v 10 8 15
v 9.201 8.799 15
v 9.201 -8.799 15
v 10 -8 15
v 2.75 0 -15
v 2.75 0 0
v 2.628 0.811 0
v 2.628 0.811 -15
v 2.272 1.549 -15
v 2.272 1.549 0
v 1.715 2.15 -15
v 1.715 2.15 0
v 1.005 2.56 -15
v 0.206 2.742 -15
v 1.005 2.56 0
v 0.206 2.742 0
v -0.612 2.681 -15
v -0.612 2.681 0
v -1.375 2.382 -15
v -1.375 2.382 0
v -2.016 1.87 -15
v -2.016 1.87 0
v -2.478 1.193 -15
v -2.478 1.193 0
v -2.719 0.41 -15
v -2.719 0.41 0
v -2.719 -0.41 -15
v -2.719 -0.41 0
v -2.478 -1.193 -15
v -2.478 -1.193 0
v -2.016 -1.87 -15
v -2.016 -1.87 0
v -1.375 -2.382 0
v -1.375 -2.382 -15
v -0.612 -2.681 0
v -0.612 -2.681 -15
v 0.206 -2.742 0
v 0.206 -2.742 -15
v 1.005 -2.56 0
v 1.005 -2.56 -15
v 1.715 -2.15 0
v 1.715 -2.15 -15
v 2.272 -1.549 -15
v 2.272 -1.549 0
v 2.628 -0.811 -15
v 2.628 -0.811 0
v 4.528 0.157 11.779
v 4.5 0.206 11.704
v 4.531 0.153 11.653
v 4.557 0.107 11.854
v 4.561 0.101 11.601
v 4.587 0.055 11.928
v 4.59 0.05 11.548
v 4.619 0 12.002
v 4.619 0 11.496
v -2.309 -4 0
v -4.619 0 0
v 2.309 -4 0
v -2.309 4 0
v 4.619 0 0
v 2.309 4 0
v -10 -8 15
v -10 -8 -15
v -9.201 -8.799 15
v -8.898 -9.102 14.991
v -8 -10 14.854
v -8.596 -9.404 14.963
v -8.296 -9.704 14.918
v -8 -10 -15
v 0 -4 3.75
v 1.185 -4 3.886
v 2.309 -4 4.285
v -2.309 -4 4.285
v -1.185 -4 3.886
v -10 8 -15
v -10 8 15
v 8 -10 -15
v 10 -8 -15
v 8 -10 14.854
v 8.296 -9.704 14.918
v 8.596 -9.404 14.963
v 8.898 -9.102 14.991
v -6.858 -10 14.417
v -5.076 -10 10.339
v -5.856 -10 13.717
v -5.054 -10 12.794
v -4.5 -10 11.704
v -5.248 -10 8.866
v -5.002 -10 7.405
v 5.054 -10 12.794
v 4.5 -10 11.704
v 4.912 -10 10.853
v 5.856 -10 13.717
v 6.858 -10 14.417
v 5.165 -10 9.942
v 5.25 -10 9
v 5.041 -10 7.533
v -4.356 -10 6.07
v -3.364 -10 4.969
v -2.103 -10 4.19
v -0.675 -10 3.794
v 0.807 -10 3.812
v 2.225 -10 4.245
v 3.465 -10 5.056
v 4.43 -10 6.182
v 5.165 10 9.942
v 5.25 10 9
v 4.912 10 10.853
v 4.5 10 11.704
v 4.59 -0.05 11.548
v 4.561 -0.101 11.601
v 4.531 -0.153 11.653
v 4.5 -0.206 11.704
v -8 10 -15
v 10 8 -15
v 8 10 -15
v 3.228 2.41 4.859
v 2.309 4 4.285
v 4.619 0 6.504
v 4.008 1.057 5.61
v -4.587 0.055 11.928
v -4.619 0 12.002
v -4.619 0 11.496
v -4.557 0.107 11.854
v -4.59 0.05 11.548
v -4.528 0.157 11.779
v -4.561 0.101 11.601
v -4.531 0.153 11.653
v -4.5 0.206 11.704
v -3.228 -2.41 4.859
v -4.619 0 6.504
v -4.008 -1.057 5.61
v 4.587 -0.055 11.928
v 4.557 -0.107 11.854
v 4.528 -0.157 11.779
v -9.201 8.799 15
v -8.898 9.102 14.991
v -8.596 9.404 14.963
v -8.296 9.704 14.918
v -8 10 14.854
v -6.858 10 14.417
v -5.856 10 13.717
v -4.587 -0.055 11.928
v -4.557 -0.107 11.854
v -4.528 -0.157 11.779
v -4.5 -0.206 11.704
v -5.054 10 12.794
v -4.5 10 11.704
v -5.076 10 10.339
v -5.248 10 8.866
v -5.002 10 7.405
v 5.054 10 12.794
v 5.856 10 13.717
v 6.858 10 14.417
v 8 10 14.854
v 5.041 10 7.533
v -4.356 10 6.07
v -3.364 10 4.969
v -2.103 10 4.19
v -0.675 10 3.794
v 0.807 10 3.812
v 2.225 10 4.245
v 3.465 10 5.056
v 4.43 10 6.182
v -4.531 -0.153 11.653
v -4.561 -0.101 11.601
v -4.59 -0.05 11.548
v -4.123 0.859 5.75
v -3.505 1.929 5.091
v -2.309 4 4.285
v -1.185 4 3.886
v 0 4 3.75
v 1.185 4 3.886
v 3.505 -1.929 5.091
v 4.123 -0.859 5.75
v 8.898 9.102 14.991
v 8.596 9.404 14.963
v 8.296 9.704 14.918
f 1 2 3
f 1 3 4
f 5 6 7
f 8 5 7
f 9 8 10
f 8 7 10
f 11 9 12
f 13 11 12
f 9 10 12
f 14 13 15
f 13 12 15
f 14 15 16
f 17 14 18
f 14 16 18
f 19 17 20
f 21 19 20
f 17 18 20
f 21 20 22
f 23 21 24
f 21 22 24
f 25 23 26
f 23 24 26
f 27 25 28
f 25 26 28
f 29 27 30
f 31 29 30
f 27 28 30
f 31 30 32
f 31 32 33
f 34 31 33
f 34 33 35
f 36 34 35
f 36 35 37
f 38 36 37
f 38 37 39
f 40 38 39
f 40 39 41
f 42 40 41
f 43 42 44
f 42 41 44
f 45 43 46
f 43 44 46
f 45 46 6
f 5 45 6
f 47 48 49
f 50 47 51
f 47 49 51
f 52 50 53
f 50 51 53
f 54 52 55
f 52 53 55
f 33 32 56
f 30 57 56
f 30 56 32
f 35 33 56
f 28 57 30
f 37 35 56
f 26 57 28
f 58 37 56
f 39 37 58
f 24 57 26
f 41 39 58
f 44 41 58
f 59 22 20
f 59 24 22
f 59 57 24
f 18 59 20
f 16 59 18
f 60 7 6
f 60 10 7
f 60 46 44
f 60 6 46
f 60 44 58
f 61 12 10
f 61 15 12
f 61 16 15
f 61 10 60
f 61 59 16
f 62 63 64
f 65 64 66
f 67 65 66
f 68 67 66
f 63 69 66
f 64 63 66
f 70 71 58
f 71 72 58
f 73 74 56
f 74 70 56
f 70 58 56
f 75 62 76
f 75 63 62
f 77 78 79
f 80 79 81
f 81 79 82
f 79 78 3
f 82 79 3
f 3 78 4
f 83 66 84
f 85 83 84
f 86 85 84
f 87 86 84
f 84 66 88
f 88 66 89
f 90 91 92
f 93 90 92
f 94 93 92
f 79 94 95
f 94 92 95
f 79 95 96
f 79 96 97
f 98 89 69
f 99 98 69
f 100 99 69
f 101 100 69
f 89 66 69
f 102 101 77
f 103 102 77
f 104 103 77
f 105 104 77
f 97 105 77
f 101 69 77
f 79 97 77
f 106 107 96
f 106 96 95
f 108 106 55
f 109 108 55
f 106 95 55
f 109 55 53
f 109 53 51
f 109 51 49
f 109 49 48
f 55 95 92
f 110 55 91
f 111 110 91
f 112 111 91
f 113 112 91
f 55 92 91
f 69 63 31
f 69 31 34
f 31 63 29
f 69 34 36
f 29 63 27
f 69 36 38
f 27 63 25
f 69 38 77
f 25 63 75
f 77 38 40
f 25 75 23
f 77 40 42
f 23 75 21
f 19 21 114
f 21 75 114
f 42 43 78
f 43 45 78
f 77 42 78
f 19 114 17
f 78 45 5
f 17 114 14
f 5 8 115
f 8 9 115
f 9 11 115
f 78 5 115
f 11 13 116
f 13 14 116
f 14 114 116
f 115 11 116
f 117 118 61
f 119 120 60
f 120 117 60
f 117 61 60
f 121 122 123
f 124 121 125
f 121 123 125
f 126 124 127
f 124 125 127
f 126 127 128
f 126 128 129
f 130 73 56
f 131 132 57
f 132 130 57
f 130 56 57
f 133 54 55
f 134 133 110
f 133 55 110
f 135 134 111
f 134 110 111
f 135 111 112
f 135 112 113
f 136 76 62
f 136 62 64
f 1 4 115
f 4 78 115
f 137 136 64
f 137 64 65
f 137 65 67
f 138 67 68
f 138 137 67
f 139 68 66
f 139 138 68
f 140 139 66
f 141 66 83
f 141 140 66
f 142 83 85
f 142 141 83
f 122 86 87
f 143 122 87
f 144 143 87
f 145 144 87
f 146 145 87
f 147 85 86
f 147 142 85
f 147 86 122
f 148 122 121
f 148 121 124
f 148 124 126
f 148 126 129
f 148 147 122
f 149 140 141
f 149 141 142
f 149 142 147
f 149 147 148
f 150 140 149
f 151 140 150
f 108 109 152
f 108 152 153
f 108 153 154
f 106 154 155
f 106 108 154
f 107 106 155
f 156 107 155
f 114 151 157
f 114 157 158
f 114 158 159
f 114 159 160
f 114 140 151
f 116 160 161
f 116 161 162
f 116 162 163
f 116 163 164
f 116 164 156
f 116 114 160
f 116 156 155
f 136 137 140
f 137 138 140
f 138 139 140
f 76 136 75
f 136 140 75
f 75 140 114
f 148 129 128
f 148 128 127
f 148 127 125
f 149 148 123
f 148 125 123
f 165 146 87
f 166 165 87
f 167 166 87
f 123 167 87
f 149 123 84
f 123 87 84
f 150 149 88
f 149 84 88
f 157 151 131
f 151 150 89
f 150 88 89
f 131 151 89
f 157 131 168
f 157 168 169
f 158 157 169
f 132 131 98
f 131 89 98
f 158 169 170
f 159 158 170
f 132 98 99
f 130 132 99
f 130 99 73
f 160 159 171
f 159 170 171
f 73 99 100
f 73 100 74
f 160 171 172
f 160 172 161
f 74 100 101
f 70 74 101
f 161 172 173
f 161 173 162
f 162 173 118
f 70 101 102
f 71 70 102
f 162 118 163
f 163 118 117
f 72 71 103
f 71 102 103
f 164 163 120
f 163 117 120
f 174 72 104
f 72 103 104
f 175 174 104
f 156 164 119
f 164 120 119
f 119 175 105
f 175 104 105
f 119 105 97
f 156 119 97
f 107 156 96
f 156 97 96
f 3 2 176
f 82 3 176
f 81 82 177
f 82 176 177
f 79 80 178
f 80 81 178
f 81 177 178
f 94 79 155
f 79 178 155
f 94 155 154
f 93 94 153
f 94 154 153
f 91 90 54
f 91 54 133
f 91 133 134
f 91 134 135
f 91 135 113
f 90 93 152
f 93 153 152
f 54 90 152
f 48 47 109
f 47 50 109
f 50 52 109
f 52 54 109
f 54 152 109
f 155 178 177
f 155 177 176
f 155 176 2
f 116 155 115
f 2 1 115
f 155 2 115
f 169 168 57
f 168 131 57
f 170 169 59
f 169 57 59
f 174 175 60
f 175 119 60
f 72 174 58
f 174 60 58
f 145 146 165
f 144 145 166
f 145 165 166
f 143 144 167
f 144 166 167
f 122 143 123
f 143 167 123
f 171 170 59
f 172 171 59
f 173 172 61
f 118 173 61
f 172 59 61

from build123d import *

# Parameters (mm, degrees)
F0_W        = 20
F0_H        = 20
F0_R        = 2.75
F1_DEPTH    = 15
F2_DEPTH    = 15
F4_DEPTH    = 20
F5_T1_DEPTH = 33.2973278516
F6_SIZE     = 2


# Not quite as in the source:
# - a fillet or chamfer that OpenCascade refuses, or shapes differently, is made with other operations: its cross-section is extruded or revolved along the edge and cut away or added


with BuildPart() as f1:
    # F0 (on Top) → F1 (new body)
    with BuildSketch(Plane.XY):
        Rectangle(F0_W, F0_H)
        Polygon((-4.6188021535, 0), (-2.3094010768, 4), (2.3094010768, 4), (4.6188021535, 0), (2.3094010768, -4), (-2.3094010768, -4), align=None, mode=Mode.SUBTRACT)
        Polygon((2.3094010768, 4), (-2.3094010768, 4), (-4.6188021535, 0), (-2.3094010768, -4), (2.3094010768, -4), (4.6188021535, 0), align=None)
        Circle(F0_R, mode=Mode.SUBTRACT)
    extrude(amount=-F1_DEPTH)

    # F0 (on Top) → F2 (join)
    with BuildSketch(Plane.XY):
        Rectangle(F0_W, F0_H)
        Polygon((-4.6188021535, 0), (-2.3094010768, 4), (2.3094010768, 4), (4.6188021535, 0), (2.3094010768, -4), (-2.3094010768, -4), align=None, mode=Mode.SUBTRACT)
    extrude(amount=F2_DEPTH)

    # F3 (on face) → F4 (cut, through all)
    with BuildSketch(Plane.XZ.offset(10)):
        with BuildLine():
            ThreePointArc((-4.5, 11.7041634566), (-1.40312152, 3.9409734138), (5.25, 9))
            ThreePointArc((5.25, 9), (5.0590265862, 10.40312152), (4.5, 11.7041634566))
            ThreePointArc((4.5, 11.7041634566), (0, 14.25), (-4.5, 11.7041634566))
        make_face()
        with BuildLine():
            ThreePointArc((-4.5, 11.7041634566), (0, 14.25), (4.5, 11.7041634566))
            Line((4.5, 11.7041634566), (4.5, 15))
            Line((4.5, 15), (-4.5, 15))
            Line((-4.5, 15), (-4.5, 11.7041634566))
        make_face()
    extrude(amount=-F4_DEPTH, mode=Mode.SUBTRACT)

    # F5: fillet of radius 5 on 2 edges, made by hand

    # F5_s2 → F5_t1 (cut)
    with BuildSketch(Plane.XZ.offset(-11.5457782428)):
        with BuildLine():
            ThreePointArc((-9.2006198435, 15), (-6.330151004, 14.0939478064), (-4.5, 11.7041634566))
            Line((-4.5, 11.7041634566), (-4.5, 15))
            Line((-4.5, 15), (-9.2006198435, 15))
        make_face()
        with BuildLine():
            ThreePointArc((9.2006198435, 15), (6.330151004, 14.0939478064), (4.5, 11.7041634566))
            Line((4.5, 11.7041634566), (4.5, 15))
            Line((4.5, 15), (9.2006198435, 15))
        make_face()
    extrude(amount=F5_T1_DEPTH, mode=Mode.SUBTRACT)

    # F6
    f6_edges = [f1.edges().sort_by_distance(p)[0] for p in [
        (-10, -10, 0),
        (10, -10, 0),
        (-10, 10, 0),
        (10, 10, 0),
    ]]
    chamfer(f6_edges, length=F6_SIZE)


solid = f1.part
